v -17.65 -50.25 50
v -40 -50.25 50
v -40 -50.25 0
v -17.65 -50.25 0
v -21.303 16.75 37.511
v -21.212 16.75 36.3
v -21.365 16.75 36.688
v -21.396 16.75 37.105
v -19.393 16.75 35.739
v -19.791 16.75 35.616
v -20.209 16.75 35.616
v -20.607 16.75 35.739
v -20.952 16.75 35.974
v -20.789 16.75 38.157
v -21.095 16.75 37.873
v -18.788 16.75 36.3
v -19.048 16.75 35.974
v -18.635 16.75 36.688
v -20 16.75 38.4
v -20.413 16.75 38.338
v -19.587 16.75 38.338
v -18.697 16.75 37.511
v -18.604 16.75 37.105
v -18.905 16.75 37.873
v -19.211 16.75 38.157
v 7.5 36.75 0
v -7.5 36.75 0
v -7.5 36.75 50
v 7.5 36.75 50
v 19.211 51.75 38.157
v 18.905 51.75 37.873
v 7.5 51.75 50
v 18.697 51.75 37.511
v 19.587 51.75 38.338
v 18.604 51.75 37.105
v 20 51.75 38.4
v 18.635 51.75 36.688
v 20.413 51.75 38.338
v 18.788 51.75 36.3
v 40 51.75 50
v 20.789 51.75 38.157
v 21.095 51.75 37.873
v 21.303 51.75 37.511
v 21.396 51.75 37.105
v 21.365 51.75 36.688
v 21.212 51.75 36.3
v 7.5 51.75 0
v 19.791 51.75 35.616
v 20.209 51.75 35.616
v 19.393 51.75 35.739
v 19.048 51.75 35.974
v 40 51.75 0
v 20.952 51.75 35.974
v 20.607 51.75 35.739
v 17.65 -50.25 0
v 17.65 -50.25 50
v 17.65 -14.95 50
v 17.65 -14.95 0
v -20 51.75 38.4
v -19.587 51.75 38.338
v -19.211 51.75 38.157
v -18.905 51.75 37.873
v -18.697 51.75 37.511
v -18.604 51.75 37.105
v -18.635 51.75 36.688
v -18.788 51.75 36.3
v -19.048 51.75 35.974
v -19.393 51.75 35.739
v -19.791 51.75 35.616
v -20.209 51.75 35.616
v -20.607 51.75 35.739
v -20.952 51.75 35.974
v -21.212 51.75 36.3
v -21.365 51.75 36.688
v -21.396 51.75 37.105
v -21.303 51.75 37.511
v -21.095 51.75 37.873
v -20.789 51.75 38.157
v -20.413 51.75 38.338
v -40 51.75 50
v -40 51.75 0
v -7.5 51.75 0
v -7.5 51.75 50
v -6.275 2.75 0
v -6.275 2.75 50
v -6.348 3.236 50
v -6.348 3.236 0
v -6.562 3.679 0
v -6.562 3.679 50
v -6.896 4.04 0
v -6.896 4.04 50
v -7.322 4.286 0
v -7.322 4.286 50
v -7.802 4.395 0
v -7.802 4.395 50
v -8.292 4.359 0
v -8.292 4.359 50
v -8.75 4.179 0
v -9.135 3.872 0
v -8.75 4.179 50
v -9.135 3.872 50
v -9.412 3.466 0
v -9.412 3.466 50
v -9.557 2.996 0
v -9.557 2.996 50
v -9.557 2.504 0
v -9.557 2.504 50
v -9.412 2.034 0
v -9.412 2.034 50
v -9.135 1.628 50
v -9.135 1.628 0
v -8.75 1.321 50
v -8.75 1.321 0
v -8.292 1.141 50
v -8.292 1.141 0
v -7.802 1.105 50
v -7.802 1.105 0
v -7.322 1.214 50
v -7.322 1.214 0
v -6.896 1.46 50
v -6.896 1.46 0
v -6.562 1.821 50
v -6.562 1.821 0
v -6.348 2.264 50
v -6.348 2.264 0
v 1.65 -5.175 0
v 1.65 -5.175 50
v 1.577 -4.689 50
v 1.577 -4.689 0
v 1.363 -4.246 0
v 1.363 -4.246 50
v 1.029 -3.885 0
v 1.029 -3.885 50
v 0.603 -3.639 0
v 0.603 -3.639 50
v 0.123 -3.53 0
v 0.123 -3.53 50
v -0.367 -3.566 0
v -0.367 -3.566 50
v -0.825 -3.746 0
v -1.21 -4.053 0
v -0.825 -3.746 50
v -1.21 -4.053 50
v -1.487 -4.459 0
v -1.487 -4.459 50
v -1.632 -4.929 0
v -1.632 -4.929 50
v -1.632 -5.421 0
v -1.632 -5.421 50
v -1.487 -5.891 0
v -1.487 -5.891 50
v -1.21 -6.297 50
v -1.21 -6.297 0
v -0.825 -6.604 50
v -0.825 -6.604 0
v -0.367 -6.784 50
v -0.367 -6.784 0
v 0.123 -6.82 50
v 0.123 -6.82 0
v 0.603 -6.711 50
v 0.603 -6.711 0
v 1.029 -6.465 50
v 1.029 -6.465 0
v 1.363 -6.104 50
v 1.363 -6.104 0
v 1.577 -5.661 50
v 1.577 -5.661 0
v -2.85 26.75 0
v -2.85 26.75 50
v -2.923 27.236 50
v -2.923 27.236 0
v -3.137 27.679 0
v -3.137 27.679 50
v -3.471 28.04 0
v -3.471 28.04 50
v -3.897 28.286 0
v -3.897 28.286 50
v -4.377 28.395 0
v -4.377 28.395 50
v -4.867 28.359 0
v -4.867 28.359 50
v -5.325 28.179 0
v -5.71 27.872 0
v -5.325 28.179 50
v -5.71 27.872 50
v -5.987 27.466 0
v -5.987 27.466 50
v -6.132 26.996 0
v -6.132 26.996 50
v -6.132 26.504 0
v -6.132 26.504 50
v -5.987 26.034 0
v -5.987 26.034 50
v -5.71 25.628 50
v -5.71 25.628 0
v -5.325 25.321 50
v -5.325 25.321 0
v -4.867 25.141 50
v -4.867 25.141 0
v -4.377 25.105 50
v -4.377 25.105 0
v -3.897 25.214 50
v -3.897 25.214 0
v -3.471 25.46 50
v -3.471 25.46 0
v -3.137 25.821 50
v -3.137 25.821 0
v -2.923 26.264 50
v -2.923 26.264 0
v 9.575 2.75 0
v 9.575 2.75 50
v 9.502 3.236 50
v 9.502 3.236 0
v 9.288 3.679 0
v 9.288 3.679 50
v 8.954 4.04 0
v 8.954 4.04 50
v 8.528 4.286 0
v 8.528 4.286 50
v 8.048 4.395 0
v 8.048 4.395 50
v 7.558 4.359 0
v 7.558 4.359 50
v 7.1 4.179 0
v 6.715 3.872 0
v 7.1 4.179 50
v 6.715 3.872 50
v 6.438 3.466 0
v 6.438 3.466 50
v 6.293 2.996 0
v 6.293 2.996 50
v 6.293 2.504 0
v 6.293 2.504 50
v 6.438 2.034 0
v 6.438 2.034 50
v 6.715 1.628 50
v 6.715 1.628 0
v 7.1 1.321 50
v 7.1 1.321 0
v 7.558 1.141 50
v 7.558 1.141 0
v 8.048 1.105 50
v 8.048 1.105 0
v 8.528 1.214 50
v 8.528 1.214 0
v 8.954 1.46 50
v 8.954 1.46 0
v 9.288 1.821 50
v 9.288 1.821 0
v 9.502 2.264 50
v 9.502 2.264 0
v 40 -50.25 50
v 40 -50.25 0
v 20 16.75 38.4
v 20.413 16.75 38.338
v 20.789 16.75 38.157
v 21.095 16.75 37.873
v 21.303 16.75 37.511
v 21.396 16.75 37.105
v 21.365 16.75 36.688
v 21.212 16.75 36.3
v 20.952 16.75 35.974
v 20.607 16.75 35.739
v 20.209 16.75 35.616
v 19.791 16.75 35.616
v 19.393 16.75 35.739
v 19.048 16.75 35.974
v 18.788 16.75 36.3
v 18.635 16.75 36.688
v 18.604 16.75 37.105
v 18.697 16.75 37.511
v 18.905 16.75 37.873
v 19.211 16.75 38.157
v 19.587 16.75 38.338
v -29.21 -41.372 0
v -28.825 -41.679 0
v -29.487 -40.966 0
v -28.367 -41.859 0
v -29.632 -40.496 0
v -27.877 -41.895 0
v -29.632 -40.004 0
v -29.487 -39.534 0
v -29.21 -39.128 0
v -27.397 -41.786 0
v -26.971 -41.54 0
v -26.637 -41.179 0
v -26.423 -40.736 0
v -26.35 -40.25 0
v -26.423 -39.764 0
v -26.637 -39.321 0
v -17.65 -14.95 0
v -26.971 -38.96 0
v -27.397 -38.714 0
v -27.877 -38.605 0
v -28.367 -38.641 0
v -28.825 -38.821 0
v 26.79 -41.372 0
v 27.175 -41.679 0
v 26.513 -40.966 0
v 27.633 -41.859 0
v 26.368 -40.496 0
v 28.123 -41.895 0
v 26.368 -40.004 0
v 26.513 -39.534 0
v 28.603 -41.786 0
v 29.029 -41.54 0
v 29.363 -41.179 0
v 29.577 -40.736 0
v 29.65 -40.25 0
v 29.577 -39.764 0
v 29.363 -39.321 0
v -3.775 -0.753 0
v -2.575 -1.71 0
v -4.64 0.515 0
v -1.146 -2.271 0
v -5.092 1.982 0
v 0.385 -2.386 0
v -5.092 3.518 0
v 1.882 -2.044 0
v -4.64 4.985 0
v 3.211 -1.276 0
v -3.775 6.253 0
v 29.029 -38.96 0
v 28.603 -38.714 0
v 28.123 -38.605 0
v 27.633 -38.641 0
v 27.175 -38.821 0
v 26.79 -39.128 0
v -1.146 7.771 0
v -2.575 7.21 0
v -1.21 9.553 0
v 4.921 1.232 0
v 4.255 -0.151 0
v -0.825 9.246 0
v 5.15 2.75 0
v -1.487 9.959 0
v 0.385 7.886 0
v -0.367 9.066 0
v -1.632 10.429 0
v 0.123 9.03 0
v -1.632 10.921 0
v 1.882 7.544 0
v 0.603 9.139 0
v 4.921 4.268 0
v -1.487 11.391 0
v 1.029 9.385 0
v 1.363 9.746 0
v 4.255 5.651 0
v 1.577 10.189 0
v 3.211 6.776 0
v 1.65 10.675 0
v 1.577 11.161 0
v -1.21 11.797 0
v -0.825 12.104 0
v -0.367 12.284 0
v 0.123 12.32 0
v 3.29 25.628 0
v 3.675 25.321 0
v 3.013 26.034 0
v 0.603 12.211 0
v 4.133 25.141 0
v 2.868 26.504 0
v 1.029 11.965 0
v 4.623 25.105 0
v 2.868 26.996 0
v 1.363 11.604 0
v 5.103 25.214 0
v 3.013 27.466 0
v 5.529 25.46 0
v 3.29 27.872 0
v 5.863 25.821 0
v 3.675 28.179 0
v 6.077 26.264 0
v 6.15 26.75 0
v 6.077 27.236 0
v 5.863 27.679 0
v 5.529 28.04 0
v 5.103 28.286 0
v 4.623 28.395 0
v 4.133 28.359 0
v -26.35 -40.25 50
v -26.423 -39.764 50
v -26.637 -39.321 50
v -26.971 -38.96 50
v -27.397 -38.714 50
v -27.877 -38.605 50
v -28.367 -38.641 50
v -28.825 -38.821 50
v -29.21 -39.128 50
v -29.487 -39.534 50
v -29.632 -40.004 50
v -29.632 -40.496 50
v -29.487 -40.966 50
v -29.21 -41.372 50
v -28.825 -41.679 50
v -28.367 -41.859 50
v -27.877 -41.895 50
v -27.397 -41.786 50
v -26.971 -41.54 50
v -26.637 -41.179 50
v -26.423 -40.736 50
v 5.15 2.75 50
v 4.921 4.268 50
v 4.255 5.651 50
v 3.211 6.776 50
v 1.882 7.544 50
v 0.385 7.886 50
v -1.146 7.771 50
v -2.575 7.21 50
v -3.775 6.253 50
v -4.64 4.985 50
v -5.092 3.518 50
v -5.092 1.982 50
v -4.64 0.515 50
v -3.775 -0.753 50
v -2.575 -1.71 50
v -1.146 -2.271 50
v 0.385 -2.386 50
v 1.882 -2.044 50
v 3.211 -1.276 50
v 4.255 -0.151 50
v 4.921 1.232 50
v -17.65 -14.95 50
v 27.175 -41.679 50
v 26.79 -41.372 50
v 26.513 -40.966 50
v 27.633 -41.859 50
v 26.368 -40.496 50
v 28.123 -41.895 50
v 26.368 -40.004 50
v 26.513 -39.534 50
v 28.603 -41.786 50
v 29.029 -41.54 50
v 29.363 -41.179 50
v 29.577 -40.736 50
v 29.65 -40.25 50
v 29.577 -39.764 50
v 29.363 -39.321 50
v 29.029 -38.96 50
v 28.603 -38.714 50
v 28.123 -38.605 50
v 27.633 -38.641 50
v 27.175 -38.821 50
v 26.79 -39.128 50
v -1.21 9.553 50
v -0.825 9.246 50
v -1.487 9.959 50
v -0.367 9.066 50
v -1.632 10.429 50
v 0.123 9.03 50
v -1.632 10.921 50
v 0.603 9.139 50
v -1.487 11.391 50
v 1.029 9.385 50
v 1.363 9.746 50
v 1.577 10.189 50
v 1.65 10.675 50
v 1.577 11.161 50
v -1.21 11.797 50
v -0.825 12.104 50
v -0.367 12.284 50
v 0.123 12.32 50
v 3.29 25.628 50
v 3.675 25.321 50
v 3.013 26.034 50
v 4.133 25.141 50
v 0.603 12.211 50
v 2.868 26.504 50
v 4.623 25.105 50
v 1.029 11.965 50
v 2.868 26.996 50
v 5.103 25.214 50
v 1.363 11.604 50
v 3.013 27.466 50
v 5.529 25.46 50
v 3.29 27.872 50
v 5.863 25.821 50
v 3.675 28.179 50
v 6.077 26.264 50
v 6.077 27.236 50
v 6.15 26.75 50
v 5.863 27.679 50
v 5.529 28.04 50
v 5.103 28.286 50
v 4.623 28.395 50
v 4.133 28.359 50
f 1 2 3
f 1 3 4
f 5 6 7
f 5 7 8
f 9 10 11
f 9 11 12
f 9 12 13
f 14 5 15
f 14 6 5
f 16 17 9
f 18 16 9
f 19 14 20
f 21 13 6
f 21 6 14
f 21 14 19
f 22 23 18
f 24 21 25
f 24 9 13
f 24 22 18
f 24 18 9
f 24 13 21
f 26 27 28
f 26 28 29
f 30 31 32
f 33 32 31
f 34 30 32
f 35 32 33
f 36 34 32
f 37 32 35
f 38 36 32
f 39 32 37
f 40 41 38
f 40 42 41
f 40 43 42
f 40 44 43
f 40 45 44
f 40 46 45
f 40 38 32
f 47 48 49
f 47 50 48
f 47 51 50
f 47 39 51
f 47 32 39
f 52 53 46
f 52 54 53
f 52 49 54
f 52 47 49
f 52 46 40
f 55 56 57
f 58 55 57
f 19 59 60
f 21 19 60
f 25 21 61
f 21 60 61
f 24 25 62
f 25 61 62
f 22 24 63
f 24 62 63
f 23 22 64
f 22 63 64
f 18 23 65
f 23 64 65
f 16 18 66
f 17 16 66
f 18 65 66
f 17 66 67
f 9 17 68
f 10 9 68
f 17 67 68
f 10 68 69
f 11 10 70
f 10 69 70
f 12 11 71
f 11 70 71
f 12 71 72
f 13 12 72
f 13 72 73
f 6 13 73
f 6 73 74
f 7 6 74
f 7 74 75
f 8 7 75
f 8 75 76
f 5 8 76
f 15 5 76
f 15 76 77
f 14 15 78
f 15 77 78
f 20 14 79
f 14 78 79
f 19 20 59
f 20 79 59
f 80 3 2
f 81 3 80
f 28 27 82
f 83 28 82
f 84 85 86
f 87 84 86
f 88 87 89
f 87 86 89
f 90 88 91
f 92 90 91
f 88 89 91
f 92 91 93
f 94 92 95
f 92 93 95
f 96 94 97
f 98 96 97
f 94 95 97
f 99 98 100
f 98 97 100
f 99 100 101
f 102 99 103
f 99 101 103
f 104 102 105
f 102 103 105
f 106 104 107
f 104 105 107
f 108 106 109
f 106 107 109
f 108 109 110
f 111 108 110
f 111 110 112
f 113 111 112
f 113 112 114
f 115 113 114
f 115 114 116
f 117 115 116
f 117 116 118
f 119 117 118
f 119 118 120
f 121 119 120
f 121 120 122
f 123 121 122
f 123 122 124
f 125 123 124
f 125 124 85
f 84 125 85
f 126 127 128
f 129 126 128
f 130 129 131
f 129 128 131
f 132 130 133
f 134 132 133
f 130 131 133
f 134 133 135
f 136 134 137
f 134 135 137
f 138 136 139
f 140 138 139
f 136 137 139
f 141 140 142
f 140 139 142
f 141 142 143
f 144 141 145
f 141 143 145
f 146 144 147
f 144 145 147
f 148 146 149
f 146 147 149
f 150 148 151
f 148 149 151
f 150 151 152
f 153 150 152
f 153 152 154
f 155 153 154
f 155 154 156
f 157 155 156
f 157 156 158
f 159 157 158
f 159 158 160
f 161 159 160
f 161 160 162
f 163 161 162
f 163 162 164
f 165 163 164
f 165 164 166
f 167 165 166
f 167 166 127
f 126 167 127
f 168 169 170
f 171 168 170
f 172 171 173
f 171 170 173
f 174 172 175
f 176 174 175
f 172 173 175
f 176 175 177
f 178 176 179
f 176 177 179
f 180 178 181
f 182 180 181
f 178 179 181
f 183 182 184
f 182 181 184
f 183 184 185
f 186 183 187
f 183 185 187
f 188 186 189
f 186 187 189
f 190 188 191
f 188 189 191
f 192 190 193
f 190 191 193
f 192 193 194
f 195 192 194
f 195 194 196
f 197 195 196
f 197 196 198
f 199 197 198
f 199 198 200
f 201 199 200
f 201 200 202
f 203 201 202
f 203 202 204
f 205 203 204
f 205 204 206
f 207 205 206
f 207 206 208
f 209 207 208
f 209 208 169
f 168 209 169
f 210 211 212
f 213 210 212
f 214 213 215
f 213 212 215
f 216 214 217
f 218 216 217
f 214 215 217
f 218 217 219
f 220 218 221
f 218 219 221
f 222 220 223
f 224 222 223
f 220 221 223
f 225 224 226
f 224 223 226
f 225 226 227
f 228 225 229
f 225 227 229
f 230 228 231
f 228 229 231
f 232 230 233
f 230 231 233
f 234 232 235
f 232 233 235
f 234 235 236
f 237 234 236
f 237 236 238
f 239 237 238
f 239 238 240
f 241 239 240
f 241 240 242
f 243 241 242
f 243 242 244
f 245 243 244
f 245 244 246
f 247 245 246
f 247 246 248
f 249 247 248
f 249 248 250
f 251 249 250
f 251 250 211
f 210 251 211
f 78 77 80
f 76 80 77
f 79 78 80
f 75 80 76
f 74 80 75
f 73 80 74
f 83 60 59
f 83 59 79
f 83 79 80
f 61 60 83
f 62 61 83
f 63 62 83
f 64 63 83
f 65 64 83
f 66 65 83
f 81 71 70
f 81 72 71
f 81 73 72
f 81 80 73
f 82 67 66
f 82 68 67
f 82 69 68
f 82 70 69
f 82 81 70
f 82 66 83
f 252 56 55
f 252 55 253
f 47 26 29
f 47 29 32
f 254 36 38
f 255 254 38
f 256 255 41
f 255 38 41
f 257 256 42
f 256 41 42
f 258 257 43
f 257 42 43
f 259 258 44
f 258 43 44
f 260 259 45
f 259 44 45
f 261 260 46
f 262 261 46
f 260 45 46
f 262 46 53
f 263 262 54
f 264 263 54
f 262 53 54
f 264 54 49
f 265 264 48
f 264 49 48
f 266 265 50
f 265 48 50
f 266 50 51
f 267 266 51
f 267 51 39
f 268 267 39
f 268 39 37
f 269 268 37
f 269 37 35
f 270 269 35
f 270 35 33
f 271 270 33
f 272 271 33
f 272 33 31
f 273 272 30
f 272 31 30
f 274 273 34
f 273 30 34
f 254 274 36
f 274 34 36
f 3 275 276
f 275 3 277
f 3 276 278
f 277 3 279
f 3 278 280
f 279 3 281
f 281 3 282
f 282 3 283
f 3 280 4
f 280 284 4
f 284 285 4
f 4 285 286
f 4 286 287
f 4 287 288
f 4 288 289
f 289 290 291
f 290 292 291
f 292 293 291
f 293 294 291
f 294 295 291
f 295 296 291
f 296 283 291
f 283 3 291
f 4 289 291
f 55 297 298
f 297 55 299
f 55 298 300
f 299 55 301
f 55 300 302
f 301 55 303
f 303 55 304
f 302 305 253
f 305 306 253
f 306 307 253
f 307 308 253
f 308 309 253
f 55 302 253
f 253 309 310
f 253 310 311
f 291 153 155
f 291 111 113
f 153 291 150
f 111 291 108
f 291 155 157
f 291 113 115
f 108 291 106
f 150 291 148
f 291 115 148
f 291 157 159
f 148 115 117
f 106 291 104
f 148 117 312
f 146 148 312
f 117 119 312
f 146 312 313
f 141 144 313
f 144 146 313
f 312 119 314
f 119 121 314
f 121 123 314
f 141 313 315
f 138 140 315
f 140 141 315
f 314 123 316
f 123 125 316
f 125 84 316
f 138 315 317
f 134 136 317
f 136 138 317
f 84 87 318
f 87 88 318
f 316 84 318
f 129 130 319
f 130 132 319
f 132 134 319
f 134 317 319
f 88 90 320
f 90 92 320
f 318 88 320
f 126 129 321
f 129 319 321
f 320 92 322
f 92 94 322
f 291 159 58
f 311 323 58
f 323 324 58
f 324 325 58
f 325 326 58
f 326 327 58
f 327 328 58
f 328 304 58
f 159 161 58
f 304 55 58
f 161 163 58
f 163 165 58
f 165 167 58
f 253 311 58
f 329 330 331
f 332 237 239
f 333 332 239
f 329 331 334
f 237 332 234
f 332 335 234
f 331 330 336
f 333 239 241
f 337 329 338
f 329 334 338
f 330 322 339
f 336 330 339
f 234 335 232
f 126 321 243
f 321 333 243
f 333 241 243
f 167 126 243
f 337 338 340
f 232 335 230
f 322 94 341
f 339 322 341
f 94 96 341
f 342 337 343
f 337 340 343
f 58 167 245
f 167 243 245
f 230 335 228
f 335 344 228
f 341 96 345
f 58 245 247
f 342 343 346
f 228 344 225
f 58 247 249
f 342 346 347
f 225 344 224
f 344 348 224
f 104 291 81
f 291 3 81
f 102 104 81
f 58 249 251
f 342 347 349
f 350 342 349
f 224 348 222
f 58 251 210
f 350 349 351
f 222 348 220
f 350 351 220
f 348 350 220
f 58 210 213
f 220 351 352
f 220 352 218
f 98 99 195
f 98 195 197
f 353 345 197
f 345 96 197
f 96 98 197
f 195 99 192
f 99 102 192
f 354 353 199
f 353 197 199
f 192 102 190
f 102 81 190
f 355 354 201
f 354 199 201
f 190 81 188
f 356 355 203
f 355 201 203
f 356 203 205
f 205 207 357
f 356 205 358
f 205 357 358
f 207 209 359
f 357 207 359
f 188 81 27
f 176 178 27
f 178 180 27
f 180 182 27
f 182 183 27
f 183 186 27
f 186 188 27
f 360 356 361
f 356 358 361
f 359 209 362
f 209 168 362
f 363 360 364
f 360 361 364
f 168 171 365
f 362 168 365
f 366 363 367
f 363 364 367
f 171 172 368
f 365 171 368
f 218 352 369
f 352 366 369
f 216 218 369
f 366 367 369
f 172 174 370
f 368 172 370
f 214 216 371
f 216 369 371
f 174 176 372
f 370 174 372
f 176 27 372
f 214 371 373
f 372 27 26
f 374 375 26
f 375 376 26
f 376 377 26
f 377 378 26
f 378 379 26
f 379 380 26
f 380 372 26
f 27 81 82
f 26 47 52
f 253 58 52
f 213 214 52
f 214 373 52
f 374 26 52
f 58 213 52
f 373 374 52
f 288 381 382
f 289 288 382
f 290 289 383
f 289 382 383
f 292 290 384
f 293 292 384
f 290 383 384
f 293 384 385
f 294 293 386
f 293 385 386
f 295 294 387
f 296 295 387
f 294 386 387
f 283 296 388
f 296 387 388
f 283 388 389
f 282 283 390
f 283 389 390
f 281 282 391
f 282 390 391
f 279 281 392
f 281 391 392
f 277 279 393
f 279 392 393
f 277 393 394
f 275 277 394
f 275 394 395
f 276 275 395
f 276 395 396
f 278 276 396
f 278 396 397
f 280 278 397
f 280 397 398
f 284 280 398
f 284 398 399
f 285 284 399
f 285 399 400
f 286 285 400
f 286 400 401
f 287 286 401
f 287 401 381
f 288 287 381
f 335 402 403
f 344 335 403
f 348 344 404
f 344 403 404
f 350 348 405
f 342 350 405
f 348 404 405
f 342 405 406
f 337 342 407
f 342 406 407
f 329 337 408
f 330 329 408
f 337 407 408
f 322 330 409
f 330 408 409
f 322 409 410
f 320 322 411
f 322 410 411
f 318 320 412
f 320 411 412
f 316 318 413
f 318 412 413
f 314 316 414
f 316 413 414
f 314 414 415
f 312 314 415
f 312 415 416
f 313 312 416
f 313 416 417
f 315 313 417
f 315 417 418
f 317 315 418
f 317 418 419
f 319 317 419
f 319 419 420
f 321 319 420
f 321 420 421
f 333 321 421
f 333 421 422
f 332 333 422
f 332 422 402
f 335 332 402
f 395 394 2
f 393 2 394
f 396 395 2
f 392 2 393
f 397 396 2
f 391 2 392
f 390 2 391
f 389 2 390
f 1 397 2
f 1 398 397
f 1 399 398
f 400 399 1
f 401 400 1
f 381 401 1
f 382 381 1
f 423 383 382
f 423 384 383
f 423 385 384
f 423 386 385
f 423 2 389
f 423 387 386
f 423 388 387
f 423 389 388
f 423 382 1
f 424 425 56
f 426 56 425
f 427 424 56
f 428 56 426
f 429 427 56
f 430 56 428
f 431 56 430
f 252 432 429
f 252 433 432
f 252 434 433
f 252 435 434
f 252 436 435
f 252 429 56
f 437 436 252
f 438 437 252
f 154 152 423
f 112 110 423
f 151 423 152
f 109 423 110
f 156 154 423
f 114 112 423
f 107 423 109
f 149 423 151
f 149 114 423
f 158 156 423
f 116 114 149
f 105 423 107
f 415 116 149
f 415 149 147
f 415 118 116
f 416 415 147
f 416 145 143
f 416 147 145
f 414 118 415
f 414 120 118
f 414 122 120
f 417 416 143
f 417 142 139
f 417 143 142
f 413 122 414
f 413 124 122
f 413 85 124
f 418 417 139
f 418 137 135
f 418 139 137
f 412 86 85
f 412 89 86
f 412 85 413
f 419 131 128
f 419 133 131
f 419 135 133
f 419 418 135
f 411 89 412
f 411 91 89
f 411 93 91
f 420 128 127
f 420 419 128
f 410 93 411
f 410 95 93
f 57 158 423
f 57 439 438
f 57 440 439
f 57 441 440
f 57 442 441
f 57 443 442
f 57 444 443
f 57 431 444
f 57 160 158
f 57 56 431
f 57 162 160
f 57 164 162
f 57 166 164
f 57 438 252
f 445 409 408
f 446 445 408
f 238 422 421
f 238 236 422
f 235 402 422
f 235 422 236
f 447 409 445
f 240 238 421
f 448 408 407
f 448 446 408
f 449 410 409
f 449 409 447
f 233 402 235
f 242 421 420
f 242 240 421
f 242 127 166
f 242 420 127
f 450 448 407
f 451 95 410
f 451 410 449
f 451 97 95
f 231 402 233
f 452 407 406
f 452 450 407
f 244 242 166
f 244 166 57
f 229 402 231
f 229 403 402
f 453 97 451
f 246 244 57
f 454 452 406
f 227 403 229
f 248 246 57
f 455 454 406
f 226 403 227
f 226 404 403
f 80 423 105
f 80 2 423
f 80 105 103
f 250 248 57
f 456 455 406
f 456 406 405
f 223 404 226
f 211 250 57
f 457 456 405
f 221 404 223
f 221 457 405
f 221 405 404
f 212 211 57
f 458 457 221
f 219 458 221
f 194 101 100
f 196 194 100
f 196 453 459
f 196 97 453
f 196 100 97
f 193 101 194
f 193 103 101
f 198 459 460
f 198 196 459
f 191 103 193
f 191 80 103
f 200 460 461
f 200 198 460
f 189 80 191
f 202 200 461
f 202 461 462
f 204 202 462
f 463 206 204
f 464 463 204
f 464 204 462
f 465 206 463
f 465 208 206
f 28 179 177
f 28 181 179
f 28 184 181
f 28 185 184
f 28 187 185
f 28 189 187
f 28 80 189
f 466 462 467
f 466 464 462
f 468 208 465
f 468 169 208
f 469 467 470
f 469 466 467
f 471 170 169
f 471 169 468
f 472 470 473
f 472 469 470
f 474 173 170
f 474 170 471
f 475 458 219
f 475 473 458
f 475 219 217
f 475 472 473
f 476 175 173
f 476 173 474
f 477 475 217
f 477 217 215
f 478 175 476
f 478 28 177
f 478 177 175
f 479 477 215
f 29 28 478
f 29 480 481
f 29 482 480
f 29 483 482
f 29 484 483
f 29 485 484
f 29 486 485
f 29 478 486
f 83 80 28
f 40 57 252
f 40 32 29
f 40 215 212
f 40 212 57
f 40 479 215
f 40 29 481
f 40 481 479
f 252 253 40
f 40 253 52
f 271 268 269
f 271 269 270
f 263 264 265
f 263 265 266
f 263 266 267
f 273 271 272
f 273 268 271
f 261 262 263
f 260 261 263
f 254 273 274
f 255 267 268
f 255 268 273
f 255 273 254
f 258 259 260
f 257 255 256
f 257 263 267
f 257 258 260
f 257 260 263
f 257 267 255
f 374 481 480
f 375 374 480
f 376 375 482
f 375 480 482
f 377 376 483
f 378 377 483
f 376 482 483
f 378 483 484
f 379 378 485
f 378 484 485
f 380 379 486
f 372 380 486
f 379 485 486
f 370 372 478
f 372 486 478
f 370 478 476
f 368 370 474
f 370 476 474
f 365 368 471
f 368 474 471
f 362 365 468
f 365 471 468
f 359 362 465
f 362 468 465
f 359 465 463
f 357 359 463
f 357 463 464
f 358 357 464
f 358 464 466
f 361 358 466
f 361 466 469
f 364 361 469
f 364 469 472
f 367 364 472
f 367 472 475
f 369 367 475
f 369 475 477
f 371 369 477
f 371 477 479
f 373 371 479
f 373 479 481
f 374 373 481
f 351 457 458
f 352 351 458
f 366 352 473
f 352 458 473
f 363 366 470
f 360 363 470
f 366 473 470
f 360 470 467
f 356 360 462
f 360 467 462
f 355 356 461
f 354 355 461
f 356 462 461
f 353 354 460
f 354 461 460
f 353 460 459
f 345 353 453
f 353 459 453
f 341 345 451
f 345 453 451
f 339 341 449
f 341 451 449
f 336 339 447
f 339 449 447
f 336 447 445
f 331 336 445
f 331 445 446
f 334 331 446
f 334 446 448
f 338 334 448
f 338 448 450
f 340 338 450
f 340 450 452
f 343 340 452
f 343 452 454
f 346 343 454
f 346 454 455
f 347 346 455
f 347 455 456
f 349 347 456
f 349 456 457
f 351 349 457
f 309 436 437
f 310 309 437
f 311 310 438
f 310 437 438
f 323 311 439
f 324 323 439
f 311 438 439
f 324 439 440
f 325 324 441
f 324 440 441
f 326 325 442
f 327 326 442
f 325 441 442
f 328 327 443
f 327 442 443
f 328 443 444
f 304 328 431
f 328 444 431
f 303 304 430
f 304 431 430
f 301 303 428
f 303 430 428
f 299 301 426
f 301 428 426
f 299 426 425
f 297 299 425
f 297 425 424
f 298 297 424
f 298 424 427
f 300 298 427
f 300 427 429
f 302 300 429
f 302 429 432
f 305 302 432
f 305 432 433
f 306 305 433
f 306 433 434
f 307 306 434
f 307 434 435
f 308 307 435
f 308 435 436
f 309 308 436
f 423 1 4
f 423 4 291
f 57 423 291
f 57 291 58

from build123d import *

# Parameters (mm, degrees)
SKETCH_1_W           = 80
SKETCH_1_H           = 103.5
EXTRUDE_1_DEPTH      = 50
SKETCH_5_R           = 1.65
CUT_EXTRUDE_4_DEPTH  = 60
SKETCH_7_W           = 15
SKETCH_7_H           = 15
CUT_EXTRUDE_6_DEPTH  = 100
SKETCH_8_R           = 1.65
CUT_EXTRUDE_7_DEPTH  = 100
SKETCH_9_R           = 5.15
CUT_EXTRUDE_8_DEPTH  = 1000
SKETCH_10_W          = 80
SKETCH_10_H          = 1.5
CUT_EXTRUDE_9_DEPTH  = 10000
SKETCH_11_W          = 35.3
SKETCH_11_H          = 35.3
CUT_EXTRUDE_10_DEPTH = 1000
SKETCH_12_R          = 1.65
CUT_EXTRUDE_11_DEPTH = 1000
SKETCH_14_R          = 1.4
CUT_EXTRUDE_12_DEPTH = 35


with BuildPart() as part:
    # 草图1 → 凸台-拉伸1 (new body)
    with BuildSketch(Plane.XY):
        Rectangle(SKETCH_1_W, SKETCH_1_H)
    extrude(amount=EXTRUDE_1_DEPTH)

    # 草图5 → 切除-拉伸4 (cut)
    with BuildSketch(Plane.XY.offset(50)):
        with Locations((7.925, 2.75)):
            Circle(SKETCH_5_R)
        with Locations((-7.925, 2.75)):
            Circle(SKETCH_5_R)
        with Locations((0, 10.675)):
            Circle(SKETCH_5_R)
        with Locations((0, -5.175)):
            Circle(SKETCH_5_R)
    extrude(amount=-CUT_EXTRUDE_4_DEPTH, mode=Mode.SUBTRACT)

    # 草图7 → 切除-拉伸6 (cut)
    with BuildSketch(Plane.XY.offset(50)):
        with Locations((0, 44.25)):
            Rectangle(SKETCH_7_W, SKETCH_7_H)
    extrude(amount=-CUT_EXTRUDE_6_DEPTH, mode=Mode.SUBTRACT)

    # 草图8 → 切除-拉伸7 (cut)
    with BuildSketch(Plane.XY.offset(50)):
        with Locations((4.5, 26.75)):
            Circle(SKETCH_8_R)
        with Locations((-4.5, 26.75)):
            Circle(SKETCH_8_R)
    extrude(amount=-CUT_EXTRUDE_7_DEPTH, mode=Mode.SUBTRACT)

    # 草图9 → 切除-拉伸8 (cut)
    with BuildSketch(Plane.XY.offset(50)):
        with Locations((0, 2.75)):
            Circle(SKETCH_9_R)
    extrude(amount=-CUT_EXTRUDE_8_DEPTH, mode=Mode.SUBTRACT)

    # 草图10 → 切除-拉伸9 (cut)
    with BuildSketch(Plane.XY.offset(50)):
        with Locations((0, -51)):
            Rectangle(SKETCH_10_W, SKETCH_10_H)
    extrude(amount=-CUT_EXTRUDE_9_DEPTH, mode=Mode.SUBTRACT)

    # 草图11 → 切除-拉伸10 (cut)
    with BuildSketch(Plane.XY.offset(50)):
        with Locations((0, -32.6)):
            Rectangle(SKETCH_11_W, SKETCH_11_H)
    extrude(amount=-CUT_EXTRUDE_10_DEPTH, mode=Mode.SUBTRACT)

    # 草图12 → 切除-拉伸11 (cut)
    with BuildSketch(Plane.XY.offset(50)):
        with Locations((28, -40.25)):
            Circle(SKETCH_12_R)
        with Locations((-28, -40.25)):
            Circle(SKETCH_12_R)
    extrude(amount=-CUT_EXTRUDE_11_DEPTH, mode=Mode.SUBTRACT)

    # 草图14 → 切除-拉伸12 (cut)
    with BuildSketch(Plane(origin=(0, 51.75, 0), x_dir=(1, 0, 0), z_dir=(0, 1, 0))):
        with Locations(Location((20, -37, 0), (0, 0, 270))):
            Circle(SKETCH_14_R)
        with Locations(Location((-20, -37, 0), (0, 0, 270))):
            Circle(SKETCH_14_R)
    extrude(amount=-CUT_EXTRUDE_12_DEPTH, mode=Mode.SUBTRACT)


solid = part.part
